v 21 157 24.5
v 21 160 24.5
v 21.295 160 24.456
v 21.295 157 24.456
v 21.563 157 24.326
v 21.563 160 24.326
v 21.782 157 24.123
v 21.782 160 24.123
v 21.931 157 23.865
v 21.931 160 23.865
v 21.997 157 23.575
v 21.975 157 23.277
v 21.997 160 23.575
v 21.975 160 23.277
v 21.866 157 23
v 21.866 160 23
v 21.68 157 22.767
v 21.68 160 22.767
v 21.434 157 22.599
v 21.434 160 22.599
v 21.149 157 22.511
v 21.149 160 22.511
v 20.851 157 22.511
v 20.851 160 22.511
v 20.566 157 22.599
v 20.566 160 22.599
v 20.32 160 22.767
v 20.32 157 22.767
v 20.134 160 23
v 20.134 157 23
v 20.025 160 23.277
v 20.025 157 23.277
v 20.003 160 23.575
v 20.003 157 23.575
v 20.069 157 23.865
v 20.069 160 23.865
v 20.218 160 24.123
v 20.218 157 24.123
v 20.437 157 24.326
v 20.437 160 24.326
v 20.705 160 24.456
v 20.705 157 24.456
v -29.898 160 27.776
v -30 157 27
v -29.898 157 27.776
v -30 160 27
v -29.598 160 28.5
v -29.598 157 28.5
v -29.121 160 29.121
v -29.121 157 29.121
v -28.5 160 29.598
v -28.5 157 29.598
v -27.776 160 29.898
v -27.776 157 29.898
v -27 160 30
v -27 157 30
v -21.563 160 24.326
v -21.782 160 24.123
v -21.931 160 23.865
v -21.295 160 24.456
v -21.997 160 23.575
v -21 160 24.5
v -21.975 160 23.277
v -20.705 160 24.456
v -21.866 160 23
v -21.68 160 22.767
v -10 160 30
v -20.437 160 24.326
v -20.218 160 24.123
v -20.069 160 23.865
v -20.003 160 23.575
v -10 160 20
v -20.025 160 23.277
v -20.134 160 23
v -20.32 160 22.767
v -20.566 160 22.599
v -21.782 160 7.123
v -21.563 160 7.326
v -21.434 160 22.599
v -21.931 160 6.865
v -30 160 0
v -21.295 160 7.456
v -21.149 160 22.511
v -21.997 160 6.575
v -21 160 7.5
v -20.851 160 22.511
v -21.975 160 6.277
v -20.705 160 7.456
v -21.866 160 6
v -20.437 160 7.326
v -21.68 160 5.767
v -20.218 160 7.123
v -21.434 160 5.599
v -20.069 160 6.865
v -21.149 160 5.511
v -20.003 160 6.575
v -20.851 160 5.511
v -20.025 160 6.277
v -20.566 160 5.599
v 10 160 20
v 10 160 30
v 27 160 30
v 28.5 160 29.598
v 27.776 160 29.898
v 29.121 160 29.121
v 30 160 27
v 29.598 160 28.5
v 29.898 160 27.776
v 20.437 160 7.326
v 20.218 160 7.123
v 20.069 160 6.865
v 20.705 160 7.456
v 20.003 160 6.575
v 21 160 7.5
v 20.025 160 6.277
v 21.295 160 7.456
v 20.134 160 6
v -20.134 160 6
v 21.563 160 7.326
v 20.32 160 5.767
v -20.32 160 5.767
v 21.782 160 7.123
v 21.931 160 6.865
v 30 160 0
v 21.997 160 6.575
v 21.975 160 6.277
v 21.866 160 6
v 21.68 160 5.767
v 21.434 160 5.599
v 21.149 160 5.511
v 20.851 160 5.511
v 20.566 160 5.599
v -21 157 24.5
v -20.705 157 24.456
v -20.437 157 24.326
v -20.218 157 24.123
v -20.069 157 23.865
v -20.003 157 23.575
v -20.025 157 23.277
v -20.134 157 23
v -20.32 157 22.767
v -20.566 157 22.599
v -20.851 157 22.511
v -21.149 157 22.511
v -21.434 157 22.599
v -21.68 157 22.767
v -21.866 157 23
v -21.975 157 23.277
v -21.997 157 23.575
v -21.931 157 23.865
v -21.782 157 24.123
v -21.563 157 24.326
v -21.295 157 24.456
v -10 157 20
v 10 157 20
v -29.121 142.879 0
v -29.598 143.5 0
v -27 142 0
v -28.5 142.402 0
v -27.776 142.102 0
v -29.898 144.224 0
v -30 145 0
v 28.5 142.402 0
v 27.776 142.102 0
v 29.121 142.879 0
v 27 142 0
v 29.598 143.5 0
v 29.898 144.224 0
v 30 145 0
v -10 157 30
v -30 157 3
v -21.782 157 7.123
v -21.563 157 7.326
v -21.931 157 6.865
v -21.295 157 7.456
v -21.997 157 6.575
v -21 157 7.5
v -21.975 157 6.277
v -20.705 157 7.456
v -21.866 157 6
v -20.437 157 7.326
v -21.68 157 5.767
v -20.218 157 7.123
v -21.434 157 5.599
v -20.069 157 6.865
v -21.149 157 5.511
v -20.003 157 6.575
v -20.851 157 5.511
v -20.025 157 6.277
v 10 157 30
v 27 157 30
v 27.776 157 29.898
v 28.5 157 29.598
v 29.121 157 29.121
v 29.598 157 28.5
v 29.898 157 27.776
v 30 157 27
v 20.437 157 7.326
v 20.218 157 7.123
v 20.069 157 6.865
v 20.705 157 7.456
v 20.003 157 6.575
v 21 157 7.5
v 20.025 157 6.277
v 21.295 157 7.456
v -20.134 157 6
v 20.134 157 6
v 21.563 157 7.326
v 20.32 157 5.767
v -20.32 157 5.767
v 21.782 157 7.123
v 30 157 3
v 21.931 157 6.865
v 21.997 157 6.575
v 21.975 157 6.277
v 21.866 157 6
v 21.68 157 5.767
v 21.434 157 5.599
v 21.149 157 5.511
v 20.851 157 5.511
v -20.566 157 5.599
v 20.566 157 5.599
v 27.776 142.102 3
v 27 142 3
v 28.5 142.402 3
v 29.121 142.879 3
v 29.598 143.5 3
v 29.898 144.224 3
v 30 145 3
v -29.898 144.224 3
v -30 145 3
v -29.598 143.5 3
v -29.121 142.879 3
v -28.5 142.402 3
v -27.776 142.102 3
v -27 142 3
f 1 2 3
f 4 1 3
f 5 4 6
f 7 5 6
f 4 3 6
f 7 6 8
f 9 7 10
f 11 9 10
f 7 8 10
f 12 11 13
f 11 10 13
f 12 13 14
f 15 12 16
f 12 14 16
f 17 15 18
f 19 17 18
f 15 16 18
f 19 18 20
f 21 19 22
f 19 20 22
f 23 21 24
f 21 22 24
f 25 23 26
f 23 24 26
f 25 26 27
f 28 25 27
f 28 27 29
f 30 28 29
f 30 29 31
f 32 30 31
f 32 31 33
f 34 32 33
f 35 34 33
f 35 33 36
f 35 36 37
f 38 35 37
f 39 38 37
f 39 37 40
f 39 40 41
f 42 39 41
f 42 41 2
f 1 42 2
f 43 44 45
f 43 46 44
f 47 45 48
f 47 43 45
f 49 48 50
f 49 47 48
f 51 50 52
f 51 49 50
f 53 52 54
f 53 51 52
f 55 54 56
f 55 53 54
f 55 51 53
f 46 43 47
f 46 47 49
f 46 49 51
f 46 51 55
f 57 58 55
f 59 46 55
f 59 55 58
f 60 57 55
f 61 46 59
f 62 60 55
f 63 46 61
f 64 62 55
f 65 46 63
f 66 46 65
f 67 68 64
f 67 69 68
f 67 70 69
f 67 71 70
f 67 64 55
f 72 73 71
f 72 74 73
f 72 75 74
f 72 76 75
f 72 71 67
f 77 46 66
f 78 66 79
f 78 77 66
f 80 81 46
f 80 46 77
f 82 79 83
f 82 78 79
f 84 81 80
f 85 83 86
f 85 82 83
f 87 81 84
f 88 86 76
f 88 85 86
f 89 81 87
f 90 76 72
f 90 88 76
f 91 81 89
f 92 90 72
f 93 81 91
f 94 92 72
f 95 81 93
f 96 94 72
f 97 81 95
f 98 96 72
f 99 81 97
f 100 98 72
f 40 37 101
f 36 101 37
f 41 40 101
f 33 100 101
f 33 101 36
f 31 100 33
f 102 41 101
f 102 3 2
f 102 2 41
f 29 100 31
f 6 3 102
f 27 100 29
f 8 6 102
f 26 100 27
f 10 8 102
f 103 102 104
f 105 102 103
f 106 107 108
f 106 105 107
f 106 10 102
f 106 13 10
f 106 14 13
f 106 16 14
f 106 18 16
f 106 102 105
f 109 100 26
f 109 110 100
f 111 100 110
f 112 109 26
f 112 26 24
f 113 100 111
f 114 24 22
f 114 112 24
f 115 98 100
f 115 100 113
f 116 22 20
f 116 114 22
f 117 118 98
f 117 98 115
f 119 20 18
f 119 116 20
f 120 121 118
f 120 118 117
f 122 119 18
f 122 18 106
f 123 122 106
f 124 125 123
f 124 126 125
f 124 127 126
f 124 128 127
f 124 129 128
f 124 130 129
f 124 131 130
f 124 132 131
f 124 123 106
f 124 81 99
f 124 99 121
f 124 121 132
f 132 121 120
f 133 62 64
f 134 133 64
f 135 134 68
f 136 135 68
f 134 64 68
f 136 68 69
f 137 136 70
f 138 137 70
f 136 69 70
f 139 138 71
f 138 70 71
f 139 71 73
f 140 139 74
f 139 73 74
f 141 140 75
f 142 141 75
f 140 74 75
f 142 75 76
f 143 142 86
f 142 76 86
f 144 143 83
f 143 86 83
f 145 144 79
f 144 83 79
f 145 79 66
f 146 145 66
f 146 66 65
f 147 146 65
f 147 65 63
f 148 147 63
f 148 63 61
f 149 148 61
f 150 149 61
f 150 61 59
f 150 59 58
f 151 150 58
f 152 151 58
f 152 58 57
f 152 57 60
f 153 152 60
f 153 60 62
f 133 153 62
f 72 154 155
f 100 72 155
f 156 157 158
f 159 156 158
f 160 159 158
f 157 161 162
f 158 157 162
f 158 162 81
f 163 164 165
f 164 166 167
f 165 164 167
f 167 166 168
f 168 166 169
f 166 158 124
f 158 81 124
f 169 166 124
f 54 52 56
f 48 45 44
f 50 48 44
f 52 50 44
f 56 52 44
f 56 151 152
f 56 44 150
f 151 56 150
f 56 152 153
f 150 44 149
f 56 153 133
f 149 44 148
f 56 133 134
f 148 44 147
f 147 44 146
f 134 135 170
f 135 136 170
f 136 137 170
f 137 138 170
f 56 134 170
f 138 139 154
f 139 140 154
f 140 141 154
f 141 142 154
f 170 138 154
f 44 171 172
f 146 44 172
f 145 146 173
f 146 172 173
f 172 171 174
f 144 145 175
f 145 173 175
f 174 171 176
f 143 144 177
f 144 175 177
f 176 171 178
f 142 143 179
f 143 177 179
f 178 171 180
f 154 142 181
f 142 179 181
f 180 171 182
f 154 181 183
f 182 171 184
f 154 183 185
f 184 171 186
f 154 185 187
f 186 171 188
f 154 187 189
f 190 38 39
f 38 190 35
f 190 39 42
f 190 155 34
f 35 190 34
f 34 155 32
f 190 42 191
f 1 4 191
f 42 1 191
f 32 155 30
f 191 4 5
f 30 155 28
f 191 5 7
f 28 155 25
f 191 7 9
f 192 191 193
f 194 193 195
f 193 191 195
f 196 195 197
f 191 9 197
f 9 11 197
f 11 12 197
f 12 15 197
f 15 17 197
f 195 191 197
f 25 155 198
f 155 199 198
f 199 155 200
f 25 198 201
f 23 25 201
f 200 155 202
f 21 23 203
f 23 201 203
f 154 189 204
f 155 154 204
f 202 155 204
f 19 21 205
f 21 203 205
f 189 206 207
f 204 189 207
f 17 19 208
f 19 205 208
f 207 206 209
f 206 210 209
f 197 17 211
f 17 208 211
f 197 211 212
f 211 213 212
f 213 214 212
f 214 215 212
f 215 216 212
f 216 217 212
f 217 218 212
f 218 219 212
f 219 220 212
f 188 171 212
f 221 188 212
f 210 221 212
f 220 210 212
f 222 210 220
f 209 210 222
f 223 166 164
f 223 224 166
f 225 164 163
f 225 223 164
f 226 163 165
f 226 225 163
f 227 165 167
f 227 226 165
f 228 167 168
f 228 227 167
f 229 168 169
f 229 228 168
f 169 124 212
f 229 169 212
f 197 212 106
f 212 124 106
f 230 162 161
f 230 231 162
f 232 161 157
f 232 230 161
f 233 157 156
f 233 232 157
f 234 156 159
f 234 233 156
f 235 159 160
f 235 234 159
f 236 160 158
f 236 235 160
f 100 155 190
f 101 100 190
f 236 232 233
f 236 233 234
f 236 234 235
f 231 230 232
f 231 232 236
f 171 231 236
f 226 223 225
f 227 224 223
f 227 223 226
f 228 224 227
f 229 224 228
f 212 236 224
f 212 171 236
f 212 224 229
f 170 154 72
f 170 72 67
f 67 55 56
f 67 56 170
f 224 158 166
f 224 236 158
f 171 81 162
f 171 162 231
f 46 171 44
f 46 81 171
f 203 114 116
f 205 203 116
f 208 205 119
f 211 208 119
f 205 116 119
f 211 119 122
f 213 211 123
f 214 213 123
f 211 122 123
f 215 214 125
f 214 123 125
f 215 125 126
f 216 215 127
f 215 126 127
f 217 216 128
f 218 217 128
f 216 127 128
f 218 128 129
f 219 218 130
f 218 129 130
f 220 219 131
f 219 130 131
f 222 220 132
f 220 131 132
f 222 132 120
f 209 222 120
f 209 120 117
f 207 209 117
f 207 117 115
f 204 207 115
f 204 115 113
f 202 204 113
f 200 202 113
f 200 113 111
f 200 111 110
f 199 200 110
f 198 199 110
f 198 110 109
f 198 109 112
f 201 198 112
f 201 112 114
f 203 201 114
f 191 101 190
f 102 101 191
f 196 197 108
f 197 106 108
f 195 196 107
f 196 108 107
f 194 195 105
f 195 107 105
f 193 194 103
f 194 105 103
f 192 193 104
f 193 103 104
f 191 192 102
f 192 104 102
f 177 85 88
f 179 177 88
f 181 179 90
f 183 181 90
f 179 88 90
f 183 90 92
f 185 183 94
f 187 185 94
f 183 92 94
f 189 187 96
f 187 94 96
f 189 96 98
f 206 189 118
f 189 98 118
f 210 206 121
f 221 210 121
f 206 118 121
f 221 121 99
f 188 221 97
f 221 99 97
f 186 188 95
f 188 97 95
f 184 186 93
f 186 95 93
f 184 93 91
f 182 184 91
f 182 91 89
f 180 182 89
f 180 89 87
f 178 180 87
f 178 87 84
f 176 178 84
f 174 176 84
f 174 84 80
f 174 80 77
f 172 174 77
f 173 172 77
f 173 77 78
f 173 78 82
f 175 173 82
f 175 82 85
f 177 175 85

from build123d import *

# Parameters (mm, degrees)
SKETCH1_W           = 60
SKETCH1_H           = 3
BOSS_EXTRUDE1_DEPTH = 30
SKETCH2_W           = 60
SKETCH2_H           = 3
BOSS_EXTRUDE2_DEPTH = 15
SKETCH3_W           = 20
SKETCH3_H           = 10
CUT_EXTRUDE1_DEPTH  = 46
FILLET1_R           = 3
SKETCH4_R           = 1
CUT_EXTRUDE2_DEPTH  = 10


with BuildPart() as part:
    # Sketch1 → Boss-Extrude1 (new body)
    with BuildSketch(Plane.XY):
        with Locations((0, 158.5)):
            Rectangle(SKETCH1_W, SKETCH1_H)
    extrude(amount=BOSS_EXTRUDE1_DEPTH)

    # Sketch2 → Boss-Extrude2 (add)
    with BuildSketch(Plane.XZ.offset(-157)):
        with Locations((0, 1.5)):
            Rectangle(SKETCH2_W, SKETCH2_H)
    extrude(amount=BOSS_EXTRUDE2_DEPTH)

    # Sketch3 → Cut-Extrude1 (cut, through all)
    with BuildSketch(Plane.XZ.offset(-157)):
        with Locations((0, 25)):
            Rectangle(SKETCH3_W, SKETCH3_H)
    extrude(amount=-CUT_EXTRUDE1_DEPTH, mode=Mode.SUBTRACT)

    # Fillet1
    fillet1_edges = [part.edges().sort_by_distance(p)[0] for p in [
        (30, 158.5, 30),
        (-30, 142, 1.5),
        (30, 142, 1.5),
        (-30, 158.5, 30),
    ]]
    fillet(fillet1_edges, radius=FILLET1_R)

    # Sketch4 → Cut-Extrude2 (cut)
    with BuildSketch(Plane(origin=(0, 160, 0), x_dir=(1, 0, 0), z_dir=(0, 1, 0))):
        with Locations(Location((-21, -23.5, 0), (0, 0, 270))):
            Circle(SKETCH4_R)
        with Locations(Location((-21, -6.5, 0), (0, 0, 270))):
            Circle(SKETCH4_R)
        with Locations(Location((21, -6.5, 0), (0, 0, 270))):
            Circle(SKETCH4_R)
        with Locations(Location((21, -23.5, 0), (0, 0, 270))):
            Circle(SKETCH4_R)
    extrude(amount=-CUT_EXTRUDE2_DEPTH, mode=Mode.SUBTRACT)


solid = part.part
